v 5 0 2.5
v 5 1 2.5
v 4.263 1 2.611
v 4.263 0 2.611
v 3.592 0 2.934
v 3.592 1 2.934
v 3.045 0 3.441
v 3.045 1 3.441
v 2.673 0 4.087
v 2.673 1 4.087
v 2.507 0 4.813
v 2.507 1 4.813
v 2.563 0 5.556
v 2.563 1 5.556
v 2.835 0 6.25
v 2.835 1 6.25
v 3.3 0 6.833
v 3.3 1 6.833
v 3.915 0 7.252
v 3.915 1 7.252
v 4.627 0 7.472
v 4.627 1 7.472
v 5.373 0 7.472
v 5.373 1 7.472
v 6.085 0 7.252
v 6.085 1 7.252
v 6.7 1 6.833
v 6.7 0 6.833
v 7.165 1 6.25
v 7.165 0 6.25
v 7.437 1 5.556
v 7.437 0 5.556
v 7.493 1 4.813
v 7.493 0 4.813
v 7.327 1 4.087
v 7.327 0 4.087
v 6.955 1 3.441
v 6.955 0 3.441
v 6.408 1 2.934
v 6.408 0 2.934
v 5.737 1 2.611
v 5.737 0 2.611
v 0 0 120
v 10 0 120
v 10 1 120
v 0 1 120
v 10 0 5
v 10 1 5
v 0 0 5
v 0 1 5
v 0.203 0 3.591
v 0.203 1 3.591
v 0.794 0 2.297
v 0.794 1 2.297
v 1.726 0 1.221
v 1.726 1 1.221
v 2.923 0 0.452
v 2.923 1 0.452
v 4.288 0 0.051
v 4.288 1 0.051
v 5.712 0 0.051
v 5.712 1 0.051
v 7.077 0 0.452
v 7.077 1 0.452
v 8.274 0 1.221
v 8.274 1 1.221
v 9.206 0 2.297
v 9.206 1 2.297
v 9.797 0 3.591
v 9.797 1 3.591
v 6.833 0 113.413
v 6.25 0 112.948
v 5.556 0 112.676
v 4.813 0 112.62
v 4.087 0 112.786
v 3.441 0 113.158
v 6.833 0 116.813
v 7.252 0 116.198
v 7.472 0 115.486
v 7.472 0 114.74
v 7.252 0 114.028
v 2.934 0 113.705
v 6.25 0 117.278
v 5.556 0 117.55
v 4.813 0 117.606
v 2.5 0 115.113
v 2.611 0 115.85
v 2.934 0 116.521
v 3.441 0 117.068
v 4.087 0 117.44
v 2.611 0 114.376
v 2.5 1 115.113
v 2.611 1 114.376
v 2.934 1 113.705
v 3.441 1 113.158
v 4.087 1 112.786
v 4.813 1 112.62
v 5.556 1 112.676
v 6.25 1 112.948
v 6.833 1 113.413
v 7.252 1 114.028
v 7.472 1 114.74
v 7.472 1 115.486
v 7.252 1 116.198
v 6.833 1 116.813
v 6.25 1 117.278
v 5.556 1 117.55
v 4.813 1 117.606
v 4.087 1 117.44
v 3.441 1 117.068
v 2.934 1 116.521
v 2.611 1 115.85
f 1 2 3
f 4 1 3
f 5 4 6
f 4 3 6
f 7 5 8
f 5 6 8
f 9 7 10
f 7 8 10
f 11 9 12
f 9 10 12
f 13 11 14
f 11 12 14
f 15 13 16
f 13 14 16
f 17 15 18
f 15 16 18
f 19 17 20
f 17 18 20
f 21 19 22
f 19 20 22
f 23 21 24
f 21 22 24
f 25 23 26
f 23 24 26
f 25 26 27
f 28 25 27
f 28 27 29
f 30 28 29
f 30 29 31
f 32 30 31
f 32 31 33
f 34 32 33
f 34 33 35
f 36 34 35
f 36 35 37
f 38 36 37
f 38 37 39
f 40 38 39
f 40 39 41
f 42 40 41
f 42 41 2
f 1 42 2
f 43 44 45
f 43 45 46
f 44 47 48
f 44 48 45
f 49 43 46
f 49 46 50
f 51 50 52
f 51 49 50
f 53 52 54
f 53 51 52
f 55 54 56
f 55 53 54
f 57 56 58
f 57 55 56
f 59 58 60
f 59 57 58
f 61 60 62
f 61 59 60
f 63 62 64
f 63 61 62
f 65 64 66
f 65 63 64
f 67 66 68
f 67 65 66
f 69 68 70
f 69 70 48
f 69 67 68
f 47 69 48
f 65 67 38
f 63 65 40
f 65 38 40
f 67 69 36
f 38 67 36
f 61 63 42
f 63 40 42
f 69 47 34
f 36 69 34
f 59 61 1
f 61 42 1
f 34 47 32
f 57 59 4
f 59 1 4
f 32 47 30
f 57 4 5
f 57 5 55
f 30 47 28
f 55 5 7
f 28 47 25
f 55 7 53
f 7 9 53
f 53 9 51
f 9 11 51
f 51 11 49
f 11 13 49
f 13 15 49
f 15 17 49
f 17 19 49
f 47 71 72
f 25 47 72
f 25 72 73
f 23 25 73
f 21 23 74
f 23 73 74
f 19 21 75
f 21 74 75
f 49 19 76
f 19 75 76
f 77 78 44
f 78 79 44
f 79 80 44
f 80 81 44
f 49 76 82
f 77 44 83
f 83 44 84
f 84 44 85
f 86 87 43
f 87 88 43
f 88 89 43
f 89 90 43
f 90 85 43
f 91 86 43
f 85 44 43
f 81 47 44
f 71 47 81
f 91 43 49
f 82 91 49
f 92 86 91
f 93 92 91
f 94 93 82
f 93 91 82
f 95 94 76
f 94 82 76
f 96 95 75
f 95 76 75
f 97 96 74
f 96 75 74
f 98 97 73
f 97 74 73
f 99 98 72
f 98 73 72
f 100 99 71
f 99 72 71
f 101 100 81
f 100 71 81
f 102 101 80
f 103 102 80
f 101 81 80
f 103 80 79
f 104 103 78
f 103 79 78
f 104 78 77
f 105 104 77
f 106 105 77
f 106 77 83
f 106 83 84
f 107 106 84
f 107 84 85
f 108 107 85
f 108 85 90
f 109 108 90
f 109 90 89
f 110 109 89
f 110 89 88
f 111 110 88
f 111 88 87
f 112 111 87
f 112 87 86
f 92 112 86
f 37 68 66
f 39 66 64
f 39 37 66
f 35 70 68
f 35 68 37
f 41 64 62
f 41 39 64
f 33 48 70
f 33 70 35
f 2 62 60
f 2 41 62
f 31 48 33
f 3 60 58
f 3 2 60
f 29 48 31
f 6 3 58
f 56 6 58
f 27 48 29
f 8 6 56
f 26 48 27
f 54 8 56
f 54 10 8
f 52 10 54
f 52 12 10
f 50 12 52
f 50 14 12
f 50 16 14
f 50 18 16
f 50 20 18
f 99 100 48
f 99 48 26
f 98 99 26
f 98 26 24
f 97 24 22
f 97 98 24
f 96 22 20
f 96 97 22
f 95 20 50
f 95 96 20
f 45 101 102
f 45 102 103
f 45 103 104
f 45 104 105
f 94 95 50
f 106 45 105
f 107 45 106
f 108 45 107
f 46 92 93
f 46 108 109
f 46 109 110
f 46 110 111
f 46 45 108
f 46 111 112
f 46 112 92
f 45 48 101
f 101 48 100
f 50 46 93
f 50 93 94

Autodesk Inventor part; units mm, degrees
ref_plane "YZ Plane" through (0, 0, 0) normal (1, 0, 0) x (0, 1, 0)
ref_plane "XZ Plane" through (0, 0, 0) normal (0, 1, 0) x (-1, 0, 0)
ref_plane "XY Plane" through (0, 0, 0) normal (0, 0, 1) x (1, 0, 0)
sketch "Skizze1" plane through (0, 0, 0) normal (0, 1, 0) x (-1, 0, 0)
  line L0 (-5, 0) -> (-5, 0)
  line L1 (-10, 5) -> (-10, 120)
  line L2 (-10, 120) -> (0, 120)
  line L3 (0, 120) -> (0, 5)
  arc A0 (-5, 0) -> (0, 5) centre (-5, 5) ccw
  arc A1 (-10, 5) -> (-5, 0) centre (-5, 5) ccw
  line L4 (-5, 5) -> (-5, 115.113)
  circle A2 centre (-5, 115.113) radius 2.5
  point P0 (0, 0)
  point P1 (-10, 0)
  dimension "d0" = 10
  dimension "d1" = 120
  dimension "d22" = 5
  dimension "d27" = 110.113
  dimension "d28" = 5
extrude "Extrusion1" add sketch "Skizze1" along normal blind 1 contours L1 L2 L3 A0 A1 | A2
extrude "Extrusion3" cut sketch "Skizze1" along normal blind 10 contours A2
hole "Bohrung3" at (5, 0, 5) direction (0, 1, 0) diameter 5 depth 8 tip angle 118
properties part number "Verbindungsstück_Rolle"
